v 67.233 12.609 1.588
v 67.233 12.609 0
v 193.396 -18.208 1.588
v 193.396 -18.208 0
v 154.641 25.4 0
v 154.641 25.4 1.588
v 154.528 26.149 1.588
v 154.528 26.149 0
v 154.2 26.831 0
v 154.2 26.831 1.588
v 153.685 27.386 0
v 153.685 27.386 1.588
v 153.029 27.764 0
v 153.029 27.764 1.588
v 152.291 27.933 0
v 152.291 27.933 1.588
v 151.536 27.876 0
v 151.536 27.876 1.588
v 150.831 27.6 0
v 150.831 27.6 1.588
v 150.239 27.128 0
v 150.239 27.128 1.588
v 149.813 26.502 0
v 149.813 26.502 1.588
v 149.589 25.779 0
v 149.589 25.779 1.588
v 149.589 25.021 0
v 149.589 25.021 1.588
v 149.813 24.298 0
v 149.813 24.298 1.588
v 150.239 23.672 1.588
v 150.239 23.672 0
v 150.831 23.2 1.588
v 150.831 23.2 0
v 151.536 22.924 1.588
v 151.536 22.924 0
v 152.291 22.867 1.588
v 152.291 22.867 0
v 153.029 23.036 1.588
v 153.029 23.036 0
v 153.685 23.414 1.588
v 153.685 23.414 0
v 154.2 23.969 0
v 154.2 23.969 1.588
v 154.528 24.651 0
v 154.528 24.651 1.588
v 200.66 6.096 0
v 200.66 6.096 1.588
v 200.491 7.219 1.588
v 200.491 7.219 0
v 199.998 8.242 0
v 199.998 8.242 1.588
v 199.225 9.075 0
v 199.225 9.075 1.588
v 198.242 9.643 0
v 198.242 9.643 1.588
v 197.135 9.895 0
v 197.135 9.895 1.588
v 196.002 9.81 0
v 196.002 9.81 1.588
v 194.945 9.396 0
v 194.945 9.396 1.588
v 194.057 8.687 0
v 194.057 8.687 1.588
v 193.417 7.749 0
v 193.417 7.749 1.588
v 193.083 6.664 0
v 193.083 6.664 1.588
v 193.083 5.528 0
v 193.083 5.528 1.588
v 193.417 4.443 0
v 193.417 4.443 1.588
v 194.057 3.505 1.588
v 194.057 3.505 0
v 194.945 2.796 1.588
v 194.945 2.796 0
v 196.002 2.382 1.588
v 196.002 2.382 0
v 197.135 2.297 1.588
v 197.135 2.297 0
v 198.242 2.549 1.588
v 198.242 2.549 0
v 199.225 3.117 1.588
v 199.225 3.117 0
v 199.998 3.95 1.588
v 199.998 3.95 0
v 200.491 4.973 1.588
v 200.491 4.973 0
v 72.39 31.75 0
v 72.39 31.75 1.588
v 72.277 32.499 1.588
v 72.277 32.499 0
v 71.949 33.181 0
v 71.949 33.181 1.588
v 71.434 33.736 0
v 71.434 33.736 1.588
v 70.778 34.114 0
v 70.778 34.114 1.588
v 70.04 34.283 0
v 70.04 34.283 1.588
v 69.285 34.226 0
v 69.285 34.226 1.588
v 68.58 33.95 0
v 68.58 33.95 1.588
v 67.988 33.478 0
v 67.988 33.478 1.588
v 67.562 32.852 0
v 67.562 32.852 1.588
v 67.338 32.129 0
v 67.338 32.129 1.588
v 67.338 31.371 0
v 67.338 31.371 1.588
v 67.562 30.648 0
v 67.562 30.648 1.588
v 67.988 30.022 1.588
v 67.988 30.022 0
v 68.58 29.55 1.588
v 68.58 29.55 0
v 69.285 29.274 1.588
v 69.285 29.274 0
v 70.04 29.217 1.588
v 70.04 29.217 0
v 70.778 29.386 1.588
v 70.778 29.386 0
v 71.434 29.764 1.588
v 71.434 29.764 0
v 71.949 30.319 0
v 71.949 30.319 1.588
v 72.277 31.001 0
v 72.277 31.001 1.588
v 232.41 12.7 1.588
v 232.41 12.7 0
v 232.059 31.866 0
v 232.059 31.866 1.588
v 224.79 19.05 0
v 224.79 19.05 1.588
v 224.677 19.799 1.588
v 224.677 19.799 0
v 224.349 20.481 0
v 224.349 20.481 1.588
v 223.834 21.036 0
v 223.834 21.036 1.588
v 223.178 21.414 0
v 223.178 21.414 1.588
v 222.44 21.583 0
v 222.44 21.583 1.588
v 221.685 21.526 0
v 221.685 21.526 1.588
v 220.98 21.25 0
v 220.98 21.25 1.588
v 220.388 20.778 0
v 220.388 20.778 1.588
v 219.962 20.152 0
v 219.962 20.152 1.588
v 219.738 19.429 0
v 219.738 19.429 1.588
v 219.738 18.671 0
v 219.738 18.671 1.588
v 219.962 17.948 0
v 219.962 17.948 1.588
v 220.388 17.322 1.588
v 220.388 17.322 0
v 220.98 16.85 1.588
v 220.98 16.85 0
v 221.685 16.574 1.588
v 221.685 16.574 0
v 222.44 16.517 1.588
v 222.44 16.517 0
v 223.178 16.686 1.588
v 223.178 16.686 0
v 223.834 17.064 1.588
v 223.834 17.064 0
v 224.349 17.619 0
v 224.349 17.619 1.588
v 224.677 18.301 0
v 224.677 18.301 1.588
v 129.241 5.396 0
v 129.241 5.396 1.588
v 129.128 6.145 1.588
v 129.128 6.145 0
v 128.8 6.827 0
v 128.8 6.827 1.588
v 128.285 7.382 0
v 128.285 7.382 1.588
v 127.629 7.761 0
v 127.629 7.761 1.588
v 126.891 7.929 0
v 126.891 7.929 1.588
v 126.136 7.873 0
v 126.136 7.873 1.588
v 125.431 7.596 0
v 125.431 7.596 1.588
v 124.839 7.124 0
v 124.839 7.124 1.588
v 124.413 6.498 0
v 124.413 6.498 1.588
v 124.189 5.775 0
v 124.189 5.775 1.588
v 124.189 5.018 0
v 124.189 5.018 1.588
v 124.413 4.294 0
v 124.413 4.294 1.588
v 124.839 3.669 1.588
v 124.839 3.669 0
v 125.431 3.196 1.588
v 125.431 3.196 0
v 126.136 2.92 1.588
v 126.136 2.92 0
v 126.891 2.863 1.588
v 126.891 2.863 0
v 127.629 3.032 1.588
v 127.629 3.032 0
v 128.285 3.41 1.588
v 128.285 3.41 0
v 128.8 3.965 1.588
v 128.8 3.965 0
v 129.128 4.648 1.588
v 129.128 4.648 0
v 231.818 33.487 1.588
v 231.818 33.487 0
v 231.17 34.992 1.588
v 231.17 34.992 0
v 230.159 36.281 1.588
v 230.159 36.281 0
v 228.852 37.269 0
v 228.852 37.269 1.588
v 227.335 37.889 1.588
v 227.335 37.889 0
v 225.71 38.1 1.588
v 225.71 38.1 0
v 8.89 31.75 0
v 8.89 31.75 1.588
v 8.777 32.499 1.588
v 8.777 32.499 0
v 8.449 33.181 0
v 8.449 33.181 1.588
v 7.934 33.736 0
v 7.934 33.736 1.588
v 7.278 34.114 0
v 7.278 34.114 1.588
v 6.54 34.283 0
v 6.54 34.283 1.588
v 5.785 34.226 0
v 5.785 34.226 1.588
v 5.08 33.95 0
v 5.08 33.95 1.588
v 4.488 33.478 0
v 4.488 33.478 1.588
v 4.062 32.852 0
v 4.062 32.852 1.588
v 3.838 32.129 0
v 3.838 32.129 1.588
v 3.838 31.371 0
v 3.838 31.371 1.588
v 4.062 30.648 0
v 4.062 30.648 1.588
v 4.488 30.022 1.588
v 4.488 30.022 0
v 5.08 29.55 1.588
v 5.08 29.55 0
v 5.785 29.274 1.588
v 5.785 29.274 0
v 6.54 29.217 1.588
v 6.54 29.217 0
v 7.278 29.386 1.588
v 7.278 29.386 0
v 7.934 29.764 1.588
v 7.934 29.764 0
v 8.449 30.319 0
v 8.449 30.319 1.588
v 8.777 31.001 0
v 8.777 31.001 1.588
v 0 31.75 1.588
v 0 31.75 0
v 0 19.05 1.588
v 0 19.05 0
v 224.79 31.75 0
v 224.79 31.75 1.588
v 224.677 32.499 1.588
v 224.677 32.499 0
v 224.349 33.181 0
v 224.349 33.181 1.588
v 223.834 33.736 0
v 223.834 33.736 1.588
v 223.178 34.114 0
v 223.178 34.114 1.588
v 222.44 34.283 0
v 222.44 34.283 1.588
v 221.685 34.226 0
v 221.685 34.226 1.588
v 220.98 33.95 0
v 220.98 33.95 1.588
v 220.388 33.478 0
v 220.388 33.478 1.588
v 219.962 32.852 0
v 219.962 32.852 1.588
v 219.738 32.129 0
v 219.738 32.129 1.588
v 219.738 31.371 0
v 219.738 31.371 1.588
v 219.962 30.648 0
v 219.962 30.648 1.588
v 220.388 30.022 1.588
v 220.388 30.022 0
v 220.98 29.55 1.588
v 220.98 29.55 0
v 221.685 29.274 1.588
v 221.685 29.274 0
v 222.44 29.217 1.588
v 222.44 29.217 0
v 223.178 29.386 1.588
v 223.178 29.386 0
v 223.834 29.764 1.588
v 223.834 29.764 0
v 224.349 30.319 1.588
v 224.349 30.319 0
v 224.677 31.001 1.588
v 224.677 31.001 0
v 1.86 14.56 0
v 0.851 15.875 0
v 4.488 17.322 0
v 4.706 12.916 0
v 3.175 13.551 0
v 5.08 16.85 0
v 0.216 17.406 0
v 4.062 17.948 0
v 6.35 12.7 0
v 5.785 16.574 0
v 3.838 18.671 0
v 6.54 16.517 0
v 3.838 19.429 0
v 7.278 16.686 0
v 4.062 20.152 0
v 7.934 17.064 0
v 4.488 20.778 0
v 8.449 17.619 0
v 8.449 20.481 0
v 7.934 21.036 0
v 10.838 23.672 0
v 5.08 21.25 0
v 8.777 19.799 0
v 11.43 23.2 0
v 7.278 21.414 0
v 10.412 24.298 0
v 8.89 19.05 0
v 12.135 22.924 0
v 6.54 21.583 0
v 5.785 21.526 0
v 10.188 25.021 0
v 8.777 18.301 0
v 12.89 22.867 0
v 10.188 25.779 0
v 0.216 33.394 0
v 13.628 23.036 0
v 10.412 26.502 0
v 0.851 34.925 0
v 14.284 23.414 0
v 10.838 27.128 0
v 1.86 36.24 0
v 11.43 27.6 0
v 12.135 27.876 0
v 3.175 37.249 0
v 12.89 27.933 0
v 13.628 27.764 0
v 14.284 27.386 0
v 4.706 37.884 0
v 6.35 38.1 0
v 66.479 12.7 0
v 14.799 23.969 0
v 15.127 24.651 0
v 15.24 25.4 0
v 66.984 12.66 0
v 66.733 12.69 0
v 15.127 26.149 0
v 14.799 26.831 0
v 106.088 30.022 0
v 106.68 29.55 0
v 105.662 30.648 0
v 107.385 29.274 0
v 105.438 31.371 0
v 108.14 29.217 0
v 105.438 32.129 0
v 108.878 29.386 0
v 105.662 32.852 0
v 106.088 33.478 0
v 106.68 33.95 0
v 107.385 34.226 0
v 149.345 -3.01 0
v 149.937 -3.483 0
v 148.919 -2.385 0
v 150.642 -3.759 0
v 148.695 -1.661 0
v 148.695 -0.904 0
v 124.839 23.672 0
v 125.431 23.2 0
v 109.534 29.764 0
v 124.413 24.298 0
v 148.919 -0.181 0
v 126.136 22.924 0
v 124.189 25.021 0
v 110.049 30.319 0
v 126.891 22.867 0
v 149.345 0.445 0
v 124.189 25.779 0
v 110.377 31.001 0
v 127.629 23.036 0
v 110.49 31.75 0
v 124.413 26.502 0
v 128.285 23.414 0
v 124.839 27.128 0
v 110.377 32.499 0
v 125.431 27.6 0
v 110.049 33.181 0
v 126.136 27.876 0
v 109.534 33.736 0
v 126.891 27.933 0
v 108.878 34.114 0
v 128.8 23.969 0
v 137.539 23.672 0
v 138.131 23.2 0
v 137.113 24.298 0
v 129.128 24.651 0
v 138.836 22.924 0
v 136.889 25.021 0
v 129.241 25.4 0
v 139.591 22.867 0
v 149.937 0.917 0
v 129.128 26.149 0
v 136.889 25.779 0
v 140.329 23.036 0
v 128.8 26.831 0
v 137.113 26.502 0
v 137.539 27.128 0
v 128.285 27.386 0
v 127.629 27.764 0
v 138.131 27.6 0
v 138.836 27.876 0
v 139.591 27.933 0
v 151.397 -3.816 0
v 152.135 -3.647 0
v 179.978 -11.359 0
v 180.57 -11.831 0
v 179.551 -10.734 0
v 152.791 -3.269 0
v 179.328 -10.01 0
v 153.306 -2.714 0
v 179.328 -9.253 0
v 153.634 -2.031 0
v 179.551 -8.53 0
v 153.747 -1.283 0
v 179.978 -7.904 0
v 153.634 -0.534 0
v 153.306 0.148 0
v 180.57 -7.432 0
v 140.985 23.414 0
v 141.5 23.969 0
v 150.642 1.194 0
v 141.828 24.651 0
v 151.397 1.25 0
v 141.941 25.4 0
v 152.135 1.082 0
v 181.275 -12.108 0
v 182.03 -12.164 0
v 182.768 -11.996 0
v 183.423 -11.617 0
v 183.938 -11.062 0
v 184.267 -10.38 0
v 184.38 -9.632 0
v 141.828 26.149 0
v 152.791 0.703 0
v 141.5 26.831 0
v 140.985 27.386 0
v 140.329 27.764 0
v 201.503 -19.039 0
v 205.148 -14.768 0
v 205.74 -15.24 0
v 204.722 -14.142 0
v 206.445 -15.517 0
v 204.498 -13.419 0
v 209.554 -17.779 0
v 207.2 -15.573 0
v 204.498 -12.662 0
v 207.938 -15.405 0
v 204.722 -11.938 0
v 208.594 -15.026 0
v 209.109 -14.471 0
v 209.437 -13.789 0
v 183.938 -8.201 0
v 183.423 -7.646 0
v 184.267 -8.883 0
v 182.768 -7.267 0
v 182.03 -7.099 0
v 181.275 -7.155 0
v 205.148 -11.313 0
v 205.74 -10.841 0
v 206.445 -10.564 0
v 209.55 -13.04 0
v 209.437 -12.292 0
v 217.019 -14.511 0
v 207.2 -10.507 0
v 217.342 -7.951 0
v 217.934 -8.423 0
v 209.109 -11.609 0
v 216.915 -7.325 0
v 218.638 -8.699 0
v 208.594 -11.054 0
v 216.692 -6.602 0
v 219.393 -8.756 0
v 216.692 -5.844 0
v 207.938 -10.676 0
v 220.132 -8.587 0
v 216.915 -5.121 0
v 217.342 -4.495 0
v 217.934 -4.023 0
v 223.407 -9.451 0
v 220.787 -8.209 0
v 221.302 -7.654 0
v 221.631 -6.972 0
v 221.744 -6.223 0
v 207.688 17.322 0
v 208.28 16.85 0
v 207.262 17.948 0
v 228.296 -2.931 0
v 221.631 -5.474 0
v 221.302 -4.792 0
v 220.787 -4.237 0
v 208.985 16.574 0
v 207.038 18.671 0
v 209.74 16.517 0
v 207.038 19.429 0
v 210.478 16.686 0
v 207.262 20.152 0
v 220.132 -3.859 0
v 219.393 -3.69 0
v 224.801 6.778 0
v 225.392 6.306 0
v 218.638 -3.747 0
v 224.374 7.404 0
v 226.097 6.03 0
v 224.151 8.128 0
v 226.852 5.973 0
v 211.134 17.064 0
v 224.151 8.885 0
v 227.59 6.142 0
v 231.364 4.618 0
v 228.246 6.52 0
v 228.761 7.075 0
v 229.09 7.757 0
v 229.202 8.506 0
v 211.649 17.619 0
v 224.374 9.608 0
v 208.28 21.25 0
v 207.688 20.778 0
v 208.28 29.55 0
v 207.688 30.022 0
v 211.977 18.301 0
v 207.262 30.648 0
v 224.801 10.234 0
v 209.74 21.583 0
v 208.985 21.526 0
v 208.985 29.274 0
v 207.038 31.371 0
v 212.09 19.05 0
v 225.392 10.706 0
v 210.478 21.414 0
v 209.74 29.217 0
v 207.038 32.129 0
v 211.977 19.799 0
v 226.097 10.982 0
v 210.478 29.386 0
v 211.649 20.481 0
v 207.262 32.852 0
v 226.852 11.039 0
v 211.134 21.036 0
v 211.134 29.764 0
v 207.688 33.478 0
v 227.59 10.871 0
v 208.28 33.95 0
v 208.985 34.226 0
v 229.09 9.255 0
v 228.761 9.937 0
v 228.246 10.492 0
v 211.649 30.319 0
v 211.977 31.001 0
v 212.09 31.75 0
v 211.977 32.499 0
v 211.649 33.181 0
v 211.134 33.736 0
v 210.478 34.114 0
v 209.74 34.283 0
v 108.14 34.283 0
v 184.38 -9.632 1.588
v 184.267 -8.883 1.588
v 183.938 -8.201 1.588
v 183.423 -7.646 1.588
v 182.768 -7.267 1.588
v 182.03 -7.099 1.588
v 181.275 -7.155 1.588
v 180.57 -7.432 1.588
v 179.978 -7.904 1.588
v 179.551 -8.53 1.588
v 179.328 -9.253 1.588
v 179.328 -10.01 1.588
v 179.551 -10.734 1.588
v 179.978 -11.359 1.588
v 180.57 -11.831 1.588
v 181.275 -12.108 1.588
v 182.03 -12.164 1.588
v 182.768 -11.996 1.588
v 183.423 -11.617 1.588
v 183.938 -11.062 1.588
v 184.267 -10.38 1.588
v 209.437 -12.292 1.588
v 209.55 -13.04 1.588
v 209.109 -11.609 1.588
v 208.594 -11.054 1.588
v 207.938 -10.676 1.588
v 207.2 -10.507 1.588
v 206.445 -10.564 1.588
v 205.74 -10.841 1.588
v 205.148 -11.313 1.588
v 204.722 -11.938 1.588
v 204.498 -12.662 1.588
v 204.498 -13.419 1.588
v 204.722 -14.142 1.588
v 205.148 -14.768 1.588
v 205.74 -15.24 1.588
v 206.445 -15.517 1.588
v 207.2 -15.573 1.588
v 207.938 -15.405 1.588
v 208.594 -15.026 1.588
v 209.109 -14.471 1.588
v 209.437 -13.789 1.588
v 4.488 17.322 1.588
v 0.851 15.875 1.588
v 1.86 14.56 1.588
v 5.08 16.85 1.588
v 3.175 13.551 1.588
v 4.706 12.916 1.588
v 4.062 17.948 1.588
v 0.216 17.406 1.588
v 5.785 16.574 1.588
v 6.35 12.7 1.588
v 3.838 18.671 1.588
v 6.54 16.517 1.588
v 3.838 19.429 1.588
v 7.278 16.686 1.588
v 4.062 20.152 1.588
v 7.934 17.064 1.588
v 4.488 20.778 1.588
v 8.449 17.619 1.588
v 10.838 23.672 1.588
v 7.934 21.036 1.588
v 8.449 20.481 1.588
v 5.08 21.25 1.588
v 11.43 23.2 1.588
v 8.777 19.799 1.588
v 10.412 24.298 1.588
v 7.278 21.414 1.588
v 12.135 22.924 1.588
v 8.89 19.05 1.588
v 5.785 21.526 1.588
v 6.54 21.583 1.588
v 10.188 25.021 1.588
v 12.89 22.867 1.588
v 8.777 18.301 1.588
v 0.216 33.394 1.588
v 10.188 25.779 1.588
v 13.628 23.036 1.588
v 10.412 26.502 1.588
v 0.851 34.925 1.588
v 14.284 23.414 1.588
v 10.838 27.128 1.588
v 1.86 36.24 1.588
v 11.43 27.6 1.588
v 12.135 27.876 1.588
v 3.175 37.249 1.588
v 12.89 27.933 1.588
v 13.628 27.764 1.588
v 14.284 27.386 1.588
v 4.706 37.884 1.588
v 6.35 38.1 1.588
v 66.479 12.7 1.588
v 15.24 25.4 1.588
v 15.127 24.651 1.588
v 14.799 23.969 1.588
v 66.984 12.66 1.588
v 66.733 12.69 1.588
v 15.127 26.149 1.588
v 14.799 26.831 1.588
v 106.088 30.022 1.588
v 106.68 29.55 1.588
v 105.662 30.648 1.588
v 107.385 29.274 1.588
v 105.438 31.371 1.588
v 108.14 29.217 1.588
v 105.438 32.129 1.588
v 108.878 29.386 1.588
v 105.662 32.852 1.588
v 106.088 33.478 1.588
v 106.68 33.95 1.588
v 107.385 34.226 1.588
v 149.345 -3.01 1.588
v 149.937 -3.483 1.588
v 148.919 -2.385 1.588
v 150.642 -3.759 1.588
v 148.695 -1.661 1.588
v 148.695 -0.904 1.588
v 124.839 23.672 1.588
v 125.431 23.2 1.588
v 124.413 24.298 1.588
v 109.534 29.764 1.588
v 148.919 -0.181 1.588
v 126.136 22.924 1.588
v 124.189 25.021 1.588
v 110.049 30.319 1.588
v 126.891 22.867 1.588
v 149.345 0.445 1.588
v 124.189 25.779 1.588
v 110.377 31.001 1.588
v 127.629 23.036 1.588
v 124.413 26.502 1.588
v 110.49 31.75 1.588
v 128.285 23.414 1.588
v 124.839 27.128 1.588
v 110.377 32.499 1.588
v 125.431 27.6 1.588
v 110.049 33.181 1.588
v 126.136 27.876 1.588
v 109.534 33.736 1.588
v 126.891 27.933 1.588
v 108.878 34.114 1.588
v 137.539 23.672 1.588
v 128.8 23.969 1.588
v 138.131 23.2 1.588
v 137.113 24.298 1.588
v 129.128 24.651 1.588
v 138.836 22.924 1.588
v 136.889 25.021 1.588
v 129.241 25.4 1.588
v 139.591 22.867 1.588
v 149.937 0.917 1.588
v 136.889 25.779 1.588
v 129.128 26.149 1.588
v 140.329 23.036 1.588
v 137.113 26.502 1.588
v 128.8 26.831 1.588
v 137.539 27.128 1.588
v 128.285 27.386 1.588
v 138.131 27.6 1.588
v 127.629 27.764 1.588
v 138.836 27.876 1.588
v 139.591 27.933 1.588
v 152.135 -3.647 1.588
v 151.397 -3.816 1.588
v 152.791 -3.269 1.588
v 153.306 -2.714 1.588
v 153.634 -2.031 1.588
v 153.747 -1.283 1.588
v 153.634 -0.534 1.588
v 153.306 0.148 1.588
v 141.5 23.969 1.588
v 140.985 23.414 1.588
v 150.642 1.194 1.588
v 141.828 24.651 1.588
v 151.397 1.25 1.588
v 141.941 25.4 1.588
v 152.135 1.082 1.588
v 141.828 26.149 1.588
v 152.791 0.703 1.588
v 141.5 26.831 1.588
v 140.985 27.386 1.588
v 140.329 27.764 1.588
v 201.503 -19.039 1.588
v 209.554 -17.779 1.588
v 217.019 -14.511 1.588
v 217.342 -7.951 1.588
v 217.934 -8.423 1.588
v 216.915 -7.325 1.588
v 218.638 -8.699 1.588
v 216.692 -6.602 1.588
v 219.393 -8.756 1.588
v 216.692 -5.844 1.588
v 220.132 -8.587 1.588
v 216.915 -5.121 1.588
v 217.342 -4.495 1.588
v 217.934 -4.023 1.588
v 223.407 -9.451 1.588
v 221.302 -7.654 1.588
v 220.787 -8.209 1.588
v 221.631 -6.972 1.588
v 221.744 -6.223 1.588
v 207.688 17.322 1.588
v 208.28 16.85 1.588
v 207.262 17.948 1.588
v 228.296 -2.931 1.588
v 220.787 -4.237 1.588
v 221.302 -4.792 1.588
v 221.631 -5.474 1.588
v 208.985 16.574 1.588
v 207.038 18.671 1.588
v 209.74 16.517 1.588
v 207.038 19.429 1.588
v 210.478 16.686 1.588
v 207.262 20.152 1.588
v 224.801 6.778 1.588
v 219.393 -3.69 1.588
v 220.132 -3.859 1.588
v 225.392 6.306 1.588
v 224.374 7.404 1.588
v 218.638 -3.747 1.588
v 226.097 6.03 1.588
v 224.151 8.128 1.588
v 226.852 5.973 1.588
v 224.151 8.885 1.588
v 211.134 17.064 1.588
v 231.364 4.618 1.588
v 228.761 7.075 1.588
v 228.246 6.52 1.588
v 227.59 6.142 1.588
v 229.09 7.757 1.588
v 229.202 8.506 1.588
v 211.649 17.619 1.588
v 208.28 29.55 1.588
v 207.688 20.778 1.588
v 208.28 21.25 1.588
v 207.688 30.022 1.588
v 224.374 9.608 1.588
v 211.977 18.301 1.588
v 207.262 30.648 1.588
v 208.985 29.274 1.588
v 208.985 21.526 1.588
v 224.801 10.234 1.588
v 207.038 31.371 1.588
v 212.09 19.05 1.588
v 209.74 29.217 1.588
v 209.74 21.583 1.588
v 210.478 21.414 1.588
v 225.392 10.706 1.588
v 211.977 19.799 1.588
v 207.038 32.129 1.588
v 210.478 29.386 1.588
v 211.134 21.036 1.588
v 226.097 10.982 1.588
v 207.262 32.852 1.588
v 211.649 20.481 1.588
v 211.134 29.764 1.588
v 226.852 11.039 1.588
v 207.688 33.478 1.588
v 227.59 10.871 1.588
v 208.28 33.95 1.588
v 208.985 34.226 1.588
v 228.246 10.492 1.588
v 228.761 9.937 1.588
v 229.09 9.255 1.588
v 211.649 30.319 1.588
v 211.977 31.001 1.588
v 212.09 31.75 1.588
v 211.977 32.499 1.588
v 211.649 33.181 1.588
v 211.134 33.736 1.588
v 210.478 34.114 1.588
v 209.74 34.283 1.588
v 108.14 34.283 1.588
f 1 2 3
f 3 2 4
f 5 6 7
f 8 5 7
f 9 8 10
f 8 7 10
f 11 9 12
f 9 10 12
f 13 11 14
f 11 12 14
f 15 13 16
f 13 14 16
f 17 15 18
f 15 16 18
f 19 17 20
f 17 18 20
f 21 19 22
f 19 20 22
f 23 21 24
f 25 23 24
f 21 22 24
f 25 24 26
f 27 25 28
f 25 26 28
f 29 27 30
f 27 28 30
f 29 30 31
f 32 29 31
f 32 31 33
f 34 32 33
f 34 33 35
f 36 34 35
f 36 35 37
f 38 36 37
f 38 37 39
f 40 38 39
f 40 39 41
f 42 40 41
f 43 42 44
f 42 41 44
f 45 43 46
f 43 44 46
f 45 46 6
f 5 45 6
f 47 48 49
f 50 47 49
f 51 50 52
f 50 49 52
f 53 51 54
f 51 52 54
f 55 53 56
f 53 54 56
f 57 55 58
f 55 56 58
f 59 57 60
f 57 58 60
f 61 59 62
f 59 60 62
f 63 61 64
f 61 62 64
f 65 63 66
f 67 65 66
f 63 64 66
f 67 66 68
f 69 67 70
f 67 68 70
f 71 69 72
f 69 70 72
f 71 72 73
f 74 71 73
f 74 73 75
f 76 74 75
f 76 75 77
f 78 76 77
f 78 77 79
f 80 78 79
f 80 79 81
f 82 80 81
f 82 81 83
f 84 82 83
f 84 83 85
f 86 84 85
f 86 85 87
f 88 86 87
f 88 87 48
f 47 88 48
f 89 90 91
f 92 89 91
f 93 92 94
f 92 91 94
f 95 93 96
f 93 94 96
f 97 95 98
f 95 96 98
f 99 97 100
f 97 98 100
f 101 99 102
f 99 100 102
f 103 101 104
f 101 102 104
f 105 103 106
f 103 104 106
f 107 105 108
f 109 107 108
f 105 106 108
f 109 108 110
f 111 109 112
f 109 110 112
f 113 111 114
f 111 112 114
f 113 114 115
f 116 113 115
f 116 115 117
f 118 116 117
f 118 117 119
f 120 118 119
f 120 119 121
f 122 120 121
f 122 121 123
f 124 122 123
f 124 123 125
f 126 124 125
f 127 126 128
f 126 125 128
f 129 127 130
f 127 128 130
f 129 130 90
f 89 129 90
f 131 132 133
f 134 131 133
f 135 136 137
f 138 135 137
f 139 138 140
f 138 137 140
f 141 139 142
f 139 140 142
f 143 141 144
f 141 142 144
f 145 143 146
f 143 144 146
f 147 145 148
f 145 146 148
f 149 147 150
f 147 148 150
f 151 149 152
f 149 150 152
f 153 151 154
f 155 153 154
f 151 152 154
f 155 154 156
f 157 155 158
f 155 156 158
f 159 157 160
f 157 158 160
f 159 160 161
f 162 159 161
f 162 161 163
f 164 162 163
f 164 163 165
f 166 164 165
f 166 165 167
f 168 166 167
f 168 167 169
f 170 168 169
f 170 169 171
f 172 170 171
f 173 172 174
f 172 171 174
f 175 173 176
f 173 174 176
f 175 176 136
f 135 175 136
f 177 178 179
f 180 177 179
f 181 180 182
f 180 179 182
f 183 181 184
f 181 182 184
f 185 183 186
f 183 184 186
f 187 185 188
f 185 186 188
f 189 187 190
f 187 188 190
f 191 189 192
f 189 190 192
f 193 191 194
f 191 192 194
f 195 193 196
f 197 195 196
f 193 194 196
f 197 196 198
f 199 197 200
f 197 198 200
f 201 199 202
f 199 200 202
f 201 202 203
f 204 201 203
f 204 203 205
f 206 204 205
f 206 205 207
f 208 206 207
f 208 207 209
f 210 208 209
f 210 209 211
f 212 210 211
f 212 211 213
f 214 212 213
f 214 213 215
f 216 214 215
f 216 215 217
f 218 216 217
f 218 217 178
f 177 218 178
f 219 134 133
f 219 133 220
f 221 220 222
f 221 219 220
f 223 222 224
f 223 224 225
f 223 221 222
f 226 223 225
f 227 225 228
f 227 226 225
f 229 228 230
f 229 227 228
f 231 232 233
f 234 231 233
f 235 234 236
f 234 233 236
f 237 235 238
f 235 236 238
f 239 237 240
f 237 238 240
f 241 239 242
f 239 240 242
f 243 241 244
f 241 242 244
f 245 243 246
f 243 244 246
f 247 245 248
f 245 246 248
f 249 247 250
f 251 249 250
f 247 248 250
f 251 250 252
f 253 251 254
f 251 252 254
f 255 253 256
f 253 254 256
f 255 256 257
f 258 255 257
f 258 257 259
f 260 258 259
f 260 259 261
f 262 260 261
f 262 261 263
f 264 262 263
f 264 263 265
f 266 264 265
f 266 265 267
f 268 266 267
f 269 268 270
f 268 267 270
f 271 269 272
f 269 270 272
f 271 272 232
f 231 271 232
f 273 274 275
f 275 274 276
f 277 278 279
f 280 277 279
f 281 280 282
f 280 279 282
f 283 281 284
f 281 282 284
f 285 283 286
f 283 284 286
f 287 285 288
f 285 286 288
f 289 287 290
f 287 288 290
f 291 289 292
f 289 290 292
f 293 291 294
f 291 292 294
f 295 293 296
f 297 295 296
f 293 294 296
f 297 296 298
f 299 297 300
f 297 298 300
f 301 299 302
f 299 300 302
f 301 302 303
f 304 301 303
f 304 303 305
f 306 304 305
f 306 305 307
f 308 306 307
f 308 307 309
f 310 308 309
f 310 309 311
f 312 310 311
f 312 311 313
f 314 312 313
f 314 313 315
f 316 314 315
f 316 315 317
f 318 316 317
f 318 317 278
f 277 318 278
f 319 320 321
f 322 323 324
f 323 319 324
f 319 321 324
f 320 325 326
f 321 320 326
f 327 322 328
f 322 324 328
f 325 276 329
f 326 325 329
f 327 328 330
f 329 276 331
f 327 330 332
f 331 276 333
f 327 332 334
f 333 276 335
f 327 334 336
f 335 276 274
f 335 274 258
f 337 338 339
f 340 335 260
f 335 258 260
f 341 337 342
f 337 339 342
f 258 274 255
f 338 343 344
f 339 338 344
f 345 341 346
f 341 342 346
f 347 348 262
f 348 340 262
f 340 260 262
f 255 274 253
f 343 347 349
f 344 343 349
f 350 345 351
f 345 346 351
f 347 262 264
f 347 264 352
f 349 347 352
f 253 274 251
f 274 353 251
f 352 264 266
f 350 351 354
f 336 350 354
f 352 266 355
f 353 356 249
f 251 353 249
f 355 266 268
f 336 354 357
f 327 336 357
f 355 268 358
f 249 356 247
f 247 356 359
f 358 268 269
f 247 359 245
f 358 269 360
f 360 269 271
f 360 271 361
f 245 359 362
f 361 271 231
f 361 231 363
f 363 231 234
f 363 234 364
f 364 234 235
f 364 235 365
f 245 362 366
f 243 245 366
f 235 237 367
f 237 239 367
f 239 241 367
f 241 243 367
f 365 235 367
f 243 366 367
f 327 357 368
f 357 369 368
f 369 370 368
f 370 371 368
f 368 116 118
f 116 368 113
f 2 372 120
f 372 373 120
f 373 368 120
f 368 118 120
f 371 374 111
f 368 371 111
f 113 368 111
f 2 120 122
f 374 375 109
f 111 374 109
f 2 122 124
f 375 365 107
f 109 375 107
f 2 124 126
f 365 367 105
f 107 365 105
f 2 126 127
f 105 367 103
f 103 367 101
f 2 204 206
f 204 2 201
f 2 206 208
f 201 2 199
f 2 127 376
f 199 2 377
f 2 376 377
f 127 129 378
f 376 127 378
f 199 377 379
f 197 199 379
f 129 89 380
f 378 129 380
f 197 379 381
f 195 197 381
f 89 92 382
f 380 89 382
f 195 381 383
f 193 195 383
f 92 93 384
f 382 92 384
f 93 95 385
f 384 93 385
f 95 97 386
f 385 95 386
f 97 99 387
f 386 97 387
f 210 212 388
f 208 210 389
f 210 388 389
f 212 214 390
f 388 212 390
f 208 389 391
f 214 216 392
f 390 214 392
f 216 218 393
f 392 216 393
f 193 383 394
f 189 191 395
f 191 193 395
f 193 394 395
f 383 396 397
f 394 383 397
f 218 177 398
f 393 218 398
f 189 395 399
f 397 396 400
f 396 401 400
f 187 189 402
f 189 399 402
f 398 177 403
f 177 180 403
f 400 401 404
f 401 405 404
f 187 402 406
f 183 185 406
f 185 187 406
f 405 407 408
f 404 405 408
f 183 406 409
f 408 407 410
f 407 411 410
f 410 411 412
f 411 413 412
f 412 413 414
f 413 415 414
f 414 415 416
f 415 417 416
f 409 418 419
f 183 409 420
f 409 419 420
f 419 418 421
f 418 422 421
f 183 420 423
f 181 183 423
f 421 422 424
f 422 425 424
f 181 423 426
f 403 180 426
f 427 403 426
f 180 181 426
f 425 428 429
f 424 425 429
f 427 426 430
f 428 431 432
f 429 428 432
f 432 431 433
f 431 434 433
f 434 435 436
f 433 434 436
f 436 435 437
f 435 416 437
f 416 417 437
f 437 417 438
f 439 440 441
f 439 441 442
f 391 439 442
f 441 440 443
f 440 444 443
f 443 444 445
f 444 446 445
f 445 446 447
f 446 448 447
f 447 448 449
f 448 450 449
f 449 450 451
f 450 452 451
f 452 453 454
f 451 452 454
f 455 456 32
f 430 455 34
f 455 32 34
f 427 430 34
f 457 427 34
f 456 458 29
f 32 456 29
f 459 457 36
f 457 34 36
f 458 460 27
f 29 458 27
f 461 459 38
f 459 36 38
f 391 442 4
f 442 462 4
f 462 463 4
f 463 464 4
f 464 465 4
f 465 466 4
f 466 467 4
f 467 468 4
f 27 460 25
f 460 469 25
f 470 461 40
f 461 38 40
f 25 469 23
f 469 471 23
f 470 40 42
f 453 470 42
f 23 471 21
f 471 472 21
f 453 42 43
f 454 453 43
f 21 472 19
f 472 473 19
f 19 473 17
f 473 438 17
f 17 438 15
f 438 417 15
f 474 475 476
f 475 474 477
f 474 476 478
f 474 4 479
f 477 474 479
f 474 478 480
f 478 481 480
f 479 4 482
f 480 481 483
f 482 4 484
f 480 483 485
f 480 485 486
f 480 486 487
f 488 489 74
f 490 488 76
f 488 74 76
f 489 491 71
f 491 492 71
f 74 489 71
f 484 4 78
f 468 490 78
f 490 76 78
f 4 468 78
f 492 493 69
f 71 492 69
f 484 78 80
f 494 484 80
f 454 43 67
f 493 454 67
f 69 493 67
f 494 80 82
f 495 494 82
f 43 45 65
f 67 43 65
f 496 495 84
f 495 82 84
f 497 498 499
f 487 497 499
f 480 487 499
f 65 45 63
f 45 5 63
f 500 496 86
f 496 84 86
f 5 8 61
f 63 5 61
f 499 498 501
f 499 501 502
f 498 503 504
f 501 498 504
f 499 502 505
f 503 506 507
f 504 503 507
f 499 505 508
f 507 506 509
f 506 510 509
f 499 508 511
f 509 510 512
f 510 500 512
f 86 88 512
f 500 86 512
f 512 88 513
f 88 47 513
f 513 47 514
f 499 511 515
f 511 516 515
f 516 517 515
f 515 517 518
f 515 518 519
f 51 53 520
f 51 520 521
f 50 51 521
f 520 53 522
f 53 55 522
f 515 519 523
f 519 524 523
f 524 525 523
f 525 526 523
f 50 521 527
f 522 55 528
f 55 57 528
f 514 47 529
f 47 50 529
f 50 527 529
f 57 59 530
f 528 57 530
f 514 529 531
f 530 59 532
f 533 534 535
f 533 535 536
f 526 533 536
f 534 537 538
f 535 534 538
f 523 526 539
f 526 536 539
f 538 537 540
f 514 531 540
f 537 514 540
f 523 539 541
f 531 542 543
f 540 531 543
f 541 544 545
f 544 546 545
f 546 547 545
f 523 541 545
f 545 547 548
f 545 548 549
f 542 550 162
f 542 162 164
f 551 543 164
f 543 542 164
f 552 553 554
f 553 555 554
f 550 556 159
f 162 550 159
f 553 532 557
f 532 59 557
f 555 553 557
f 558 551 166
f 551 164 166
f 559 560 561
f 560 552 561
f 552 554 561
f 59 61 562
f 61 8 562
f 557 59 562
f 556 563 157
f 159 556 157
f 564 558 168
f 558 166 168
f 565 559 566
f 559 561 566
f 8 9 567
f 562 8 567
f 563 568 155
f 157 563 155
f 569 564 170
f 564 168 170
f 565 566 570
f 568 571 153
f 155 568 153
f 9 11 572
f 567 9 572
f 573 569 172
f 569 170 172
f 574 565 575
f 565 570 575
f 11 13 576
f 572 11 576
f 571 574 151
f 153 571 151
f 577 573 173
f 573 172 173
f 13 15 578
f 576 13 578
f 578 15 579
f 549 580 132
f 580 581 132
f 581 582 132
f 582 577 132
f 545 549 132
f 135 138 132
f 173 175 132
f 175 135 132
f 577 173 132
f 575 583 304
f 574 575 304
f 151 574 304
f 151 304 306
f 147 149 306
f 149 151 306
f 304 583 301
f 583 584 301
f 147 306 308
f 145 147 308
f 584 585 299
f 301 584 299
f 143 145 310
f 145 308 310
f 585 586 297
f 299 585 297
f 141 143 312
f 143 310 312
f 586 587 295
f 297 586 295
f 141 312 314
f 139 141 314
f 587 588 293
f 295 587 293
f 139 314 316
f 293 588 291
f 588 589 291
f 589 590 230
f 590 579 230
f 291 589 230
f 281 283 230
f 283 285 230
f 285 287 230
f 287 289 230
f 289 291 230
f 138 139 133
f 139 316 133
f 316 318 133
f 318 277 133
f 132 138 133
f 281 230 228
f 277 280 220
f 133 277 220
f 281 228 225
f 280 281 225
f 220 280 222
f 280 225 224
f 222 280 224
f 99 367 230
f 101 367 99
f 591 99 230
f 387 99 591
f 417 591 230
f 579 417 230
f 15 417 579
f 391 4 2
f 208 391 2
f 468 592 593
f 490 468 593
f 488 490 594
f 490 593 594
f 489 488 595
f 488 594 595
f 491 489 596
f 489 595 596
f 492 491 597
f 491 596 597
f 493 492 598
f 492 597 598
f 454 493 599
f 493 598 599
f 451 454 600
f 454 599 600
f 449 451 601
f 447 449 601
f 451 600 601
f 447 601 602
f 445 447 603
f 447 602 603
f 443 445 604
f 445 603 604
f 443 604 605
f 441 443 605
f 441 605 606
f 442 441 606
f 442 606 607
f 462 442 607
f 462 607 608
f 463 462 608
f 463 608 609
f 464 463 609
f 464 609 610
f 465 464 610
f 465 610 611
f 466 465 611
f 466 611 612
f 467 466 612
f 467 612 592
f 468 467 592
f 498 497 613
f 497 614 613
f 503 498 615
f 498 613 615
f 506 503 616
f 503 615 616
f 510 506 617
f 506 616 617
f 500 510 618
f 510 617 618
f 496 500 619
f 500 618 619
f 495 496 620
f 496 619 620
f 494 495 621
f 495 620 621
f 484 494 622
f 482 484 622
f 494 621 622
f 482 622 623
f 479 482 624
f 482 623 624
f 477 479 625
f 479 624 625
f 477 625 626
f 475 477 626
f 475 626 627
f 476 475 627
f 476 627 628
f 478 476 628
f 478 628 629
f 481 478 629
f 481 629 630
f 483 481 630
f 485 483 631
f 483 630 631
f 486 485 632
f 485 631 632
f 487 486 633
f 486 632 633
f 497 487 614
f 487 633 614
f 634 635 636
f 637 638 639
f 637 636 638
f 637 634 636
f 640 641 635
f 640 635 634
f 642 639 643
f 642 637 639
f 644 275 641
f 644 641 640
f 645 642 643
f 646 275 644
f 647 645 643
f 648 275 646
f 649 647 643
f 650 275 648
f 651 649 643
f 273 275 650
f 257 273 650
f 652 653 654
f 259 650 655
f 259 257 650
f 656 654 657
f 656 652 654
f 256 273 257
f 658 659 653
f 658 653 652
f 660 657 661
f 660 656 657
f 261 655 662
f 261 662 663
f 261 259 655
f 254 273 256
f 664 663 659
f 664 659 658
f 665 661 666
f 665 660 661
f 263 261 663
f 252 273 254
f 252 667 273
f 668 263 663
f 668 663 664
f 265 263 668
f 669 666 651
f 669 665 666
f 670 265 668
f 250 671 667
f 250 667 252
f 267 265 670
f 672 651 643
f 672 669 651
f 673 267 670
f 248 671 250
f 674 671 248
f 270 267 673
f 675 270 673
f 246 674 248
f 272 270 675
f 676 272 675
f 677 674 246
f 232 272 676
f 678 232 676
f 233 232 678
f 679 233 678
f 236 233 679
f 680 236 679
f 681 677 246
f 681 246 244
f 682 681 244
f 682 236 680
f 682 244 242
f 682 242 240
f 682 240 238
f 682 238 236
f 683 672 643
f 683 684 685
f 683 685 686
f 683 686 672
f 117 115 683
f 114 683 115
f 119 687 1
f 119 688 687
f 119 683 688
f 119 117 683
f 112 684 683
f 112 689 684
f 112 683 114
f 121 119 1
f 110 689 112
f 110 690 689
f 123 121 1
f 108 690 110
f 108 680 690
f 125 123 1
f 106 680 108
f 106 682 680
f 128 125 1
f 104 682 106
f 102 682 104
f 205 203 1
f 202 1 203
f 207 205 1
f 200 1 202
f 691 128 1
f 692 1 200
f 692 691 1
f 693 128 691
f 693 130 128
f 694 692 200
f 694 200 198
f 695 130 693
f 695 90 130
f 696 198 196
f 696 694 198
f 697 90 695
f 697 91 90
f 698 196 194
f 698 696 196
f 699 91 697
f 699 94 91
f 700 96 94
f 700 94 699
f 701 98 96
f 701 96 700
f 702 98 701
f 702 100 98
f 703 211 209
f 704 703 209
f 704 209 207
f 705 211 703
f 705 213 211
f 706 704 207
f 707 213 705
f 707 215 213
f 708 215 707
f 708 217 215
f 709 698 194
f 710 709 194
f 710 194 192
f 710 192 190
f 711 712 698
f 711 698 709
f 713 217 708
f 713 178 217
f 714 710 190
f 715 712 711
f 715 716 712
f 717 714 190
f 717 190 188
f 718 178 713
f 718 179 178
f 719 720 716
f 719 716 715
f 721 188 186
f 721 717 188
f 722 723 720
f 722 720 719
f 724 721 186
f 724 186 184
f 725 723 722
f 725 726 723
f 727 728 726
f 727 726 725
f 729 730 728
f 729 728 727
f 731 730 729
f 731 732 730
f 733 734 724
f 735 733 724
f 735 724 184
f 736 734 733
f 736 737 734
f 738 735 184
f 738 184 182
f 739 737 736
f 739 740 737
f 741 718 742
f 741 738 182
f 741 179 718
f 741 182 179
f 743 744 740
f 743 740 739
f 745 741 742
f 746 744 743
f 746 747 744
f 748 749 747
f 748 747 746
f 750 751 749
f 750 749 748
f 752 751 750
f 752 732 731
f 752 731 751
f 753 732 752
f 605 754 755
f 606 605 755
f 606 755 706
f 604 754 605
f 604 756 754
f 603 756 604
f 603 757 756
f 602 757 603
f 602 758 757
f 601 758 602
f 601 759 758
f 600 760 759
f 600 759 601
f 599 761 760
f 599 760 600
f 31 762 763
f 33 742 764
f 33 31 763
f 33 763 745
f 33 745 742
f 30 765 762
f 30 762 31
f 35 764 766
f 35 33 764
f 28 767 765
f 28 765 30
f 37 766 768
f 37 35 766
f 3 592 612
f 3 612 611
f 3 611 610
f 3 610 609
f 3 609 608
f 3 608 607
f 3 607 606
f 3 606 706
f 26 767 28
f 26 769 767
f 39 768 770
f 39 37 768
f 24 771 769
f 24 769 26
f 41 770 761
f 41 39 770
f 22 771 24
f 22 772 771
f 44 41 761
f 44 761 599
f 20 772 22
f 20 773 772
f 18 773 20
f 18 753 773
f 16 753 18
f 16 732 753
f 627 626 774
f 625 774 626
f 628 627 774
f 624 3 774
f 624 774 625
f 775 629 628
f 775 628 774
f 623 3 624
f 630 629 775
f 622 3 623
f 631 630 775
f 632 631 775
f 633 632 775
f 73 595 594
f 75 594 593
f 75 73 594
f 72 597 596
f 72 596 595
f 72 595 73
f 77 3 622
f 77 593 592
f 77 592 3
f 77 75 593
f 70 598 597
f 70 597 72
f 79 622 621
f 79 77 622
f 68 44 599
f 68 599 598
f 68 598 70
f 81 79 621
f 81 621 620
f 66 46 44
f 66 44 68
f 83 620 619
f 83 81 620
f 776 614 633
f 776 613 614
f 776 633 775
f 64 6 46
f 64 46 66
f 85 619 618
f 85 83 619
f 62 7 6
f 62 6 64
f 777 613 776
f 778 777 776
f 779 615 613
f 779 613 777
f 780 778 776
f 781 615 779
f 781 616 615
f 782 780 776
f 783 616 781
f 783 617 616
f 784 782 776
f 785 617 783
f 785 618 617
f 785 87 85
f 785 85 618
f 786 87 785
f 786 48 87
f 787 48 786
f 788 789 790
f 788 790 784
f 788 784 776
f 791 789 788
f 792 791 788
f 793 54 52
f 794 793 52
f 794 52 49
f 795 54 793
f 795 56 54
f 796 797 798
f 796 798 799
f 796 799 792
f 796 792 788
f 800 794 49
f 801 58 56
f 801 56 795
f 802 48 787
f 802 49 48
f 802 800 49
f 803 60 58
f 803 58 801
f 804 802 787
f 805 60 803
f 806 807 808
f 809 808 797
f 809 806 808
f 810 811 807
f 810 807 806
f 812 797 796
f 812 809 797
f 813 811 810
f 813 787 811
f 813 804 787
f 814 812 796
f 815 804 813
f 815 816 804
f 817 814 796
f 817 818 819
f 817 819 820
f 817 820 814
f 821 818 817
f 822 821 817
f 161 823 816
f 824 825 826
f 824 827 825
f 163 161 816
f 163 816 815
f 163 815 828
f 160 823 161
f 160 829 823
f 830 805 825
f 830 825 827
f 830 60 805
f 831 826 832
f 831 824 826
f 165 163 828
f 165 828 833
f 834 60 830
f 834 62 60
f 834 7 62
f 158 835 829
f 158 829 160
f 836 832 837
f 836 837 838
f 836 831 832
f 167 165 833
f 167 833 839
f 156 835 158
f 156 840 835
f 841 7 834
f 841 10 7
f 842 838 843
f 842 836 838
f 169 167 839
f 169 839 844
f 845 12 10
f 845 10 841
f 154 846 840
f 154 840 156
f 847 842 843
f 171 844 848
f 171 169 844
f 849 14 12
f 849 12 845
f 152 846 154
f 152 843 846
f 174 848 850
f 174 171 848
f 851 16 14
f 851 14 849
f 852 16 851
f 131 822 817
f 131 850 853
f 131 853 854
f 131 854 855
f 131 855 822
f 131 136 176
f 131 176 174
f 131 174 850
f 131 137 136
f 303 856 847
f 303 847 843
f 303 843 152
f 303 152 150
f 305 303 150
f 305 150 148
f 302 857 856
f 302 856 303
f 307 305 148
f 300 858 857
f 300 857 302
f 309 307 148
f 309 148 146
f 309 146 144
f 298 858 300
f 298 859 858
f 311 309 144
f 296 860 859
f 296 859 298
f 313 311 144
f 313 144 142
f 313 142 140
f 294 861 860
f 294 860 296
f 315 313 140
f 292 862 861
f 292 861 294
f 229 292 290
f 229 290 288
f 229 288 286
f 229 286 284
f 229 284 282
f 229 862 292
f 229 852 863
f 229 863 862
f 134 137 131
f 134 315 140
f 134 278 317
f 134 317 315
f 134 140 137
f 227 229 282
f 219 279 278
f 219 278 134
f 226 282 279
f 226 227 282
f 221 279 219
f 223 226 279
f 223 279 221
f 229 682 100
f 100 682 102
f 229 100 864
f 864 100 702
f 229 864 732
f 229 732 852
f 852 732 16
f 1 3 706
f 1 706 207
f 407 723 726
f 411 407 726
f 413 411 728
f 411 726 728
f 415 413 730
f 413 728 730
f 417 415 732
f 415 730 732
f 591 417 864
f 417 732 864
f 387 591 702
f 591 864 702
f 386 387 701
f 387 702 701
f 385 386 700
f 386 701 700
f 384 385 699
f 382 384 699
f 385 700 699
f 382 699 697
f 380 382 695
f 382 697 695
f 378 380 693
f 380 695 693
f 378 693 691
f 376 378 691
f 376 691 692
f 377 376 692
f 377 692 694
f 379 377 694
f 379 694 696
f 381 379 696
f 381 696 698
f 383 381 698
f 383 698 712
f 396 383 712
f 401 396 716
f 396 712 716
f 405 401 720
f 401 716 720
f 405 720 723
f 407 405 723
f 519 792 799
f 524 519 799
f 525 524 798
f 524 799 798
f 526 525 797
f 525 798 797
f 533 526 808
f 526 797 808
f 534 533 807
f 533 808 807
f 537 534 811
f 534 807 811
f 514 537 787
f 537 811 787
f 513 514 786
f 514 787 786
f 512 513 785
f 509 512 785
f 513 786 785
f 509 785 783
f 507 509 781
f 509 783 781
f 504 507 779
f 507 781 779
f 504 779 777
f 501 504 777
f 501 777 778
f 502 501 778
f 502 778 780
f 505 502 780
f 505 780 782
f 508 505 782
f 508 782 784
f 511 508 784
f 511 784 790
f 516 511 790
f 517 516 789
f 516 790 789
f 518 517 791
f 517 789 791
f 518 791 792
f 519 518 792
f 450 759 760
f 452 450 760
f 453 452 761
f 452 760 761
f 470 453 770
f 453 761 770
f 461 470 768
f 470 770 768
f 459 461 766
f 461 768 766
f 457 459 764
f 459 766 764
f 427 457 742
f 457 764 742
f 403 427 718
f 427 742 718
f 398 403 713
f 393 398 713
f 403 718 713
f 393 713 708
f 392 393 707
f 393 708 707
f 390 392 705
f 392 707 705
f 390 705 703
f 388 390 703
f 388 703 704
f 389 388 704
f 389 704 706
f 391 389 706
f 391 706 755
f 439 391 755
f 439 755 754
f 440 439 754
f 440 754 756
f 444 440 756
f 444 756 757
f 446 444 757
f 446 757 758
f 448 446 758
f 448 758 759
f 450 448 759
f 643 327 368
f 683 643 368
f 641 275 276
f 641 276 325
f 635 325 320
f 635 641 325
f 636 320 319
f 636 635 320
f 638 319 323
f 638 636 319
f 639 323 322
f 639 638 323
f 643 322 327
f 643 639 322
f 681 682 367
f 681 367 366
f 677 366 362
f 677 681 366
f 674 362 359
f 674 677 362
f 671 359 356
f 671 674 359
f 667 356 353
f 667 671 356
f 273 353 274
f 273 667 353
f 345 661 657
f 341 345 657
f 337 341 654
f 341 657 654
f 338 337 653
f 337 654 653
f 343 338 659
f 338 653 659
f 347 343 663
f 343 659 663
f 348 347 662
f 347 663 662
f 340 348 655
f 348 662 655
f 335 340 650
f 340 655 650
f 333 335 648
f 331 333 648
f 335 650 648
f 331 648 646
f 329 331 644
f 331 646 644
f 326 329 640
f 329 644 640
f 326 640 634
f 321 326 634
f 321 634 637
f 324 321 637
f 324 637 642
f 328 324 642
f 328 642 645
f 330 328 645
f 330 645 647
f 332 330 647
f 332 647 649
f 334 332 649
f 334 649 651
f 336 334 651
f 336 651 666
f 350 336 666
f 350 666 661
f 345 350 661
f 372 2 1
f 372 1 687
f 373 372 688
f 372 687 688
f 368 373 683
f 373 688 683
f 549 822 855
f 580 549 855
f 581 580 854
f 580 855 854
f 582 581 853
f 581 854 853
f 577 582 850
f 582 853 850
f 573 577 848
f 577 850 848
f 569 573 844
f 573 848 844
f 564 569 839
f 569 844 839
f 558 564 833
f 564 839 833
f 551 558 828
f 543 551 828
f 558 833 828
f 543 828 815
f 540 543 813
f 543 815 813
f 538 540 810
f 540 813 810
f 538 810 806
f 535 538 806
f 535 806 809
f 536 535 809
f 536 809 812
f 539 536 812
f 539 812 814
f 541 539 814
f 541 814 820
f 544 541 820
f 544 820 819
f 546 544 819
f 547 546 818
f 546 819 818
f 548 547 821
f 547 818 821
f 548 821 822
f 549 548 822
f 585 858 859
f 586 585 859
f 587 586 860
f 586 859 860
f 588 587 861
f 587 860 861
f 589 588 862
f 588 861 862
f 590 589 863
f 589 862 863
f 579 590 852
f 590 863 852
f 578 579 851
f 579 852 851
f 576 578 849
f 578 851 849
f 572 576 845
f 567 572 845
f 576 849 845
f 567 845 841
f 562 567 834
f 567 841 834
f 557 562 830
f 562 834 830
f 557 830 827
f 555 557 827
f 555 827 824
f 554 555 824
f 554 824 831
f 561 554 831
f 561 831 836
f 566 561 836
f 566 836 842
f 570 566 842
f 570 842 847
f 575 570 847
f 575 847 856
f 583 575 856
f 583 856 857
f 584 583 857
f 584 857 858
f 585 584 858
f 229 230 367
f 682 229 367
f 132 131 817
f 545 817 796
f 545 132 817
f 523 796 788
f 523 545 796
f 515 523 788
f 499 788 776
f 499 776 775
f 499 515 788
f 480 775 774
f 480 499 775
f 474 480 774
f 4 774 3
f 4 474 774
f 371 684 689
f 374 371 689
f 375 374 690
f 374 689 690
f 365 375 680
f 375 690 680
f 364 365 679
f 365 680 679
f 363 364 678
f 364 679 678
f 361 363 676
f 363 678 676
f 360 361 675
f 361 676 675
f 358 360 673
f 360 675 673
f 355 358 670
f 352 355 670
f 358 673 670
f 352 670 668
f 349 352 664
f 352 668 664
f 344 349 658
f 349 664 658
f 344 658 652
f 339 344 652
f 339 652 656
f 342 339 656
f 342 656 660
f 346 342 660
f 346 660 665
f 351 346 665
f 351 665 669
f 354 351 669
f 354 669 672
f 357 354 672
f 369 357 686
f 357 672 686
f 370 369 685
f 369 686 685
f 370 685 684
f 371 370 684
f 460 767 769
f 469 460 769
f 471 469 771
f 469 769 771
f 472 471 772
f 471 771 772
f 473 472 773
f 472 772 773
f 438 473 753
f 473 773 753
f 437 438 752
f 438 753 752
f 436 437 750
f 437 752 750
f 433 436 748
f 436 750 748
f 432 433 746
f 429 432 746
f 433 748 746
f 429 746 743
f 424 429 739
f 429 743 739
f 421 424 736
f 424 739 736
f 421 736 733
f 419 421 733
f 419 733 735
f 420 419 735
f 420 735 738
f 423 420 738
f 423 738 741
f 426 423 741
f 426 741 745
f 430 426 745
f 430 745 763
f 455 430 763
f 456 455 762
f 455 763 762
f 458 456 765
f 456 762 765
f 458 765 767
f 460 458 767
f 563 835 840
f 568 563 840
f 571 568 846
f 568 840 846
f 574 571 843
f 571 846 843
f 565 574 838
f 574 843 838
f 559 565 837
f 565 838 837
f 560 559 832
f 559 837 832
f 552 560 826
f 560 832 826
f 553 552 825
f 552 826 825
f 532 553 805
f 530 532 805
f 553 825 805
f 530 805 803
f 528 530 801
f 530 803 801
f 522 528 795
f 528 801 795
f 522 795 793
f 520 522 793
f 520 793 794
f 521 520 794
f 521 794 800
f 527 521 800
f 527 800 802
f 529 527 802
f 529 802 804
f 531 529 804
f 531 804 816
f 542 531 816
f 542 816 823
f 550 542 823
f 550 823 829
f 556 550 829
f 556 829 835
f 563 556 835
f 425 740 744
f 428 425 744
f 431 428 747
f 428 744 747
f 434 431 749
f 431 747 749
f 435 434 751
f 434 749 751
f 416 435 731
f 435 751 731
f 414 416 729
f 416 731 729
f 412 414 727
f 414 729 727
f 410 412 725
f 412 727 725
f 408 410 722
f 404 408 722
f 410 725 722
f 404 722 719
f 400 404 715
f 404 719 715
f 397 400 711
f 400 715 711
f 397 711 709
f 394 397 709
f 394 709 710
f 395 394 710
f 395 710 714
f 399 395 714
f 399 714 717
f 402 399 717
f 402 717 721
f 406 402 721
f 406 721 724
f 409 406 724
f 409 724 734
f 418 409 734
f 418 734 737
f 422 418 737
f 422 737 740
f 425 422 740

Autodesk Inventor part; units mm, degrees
ref_plane "YZ Plane" through (0, 0, 0) normal (1, 0, 0) x (0, 1, 0)
ref_plane "XZ Plane" through (0, 0, 0) normal (0, 1, 0) x (-1, 0, 0)
ref_plane "XY Plane" through (0, 0, 0) normal (0, 0, 1) x (1, 0, 0)
sketch "Sketch1" plane through (0, 0, 0) normal (0, 0, 1) x (1, 0, 0)
  line L0 (0, 0) -> (247.65, 0)
  line L1 (247.65, 0) -> (247.65, 38.1)
  line L2 (247.65, 38.1) -> (0, 38.1)
  line L3 (0, 38.1) -> (0, 0)
  line L4 (286.1616, 0) -> (255.1962, 0)
  line L5 (255.1962, 0) -> (255.1962, 12.7)
  line L6 (255.1962, 12.7) -> (286.1616, 12.7)
  line L7 (286.1616, 12.7) -> (286.1616, 0)
  line L8 (247.65, 12.7) -> (200.66, 12.7)
  line L9 (16.2468, 38.1) -> (16.2468, 12.7)
  line L10 (16.2468, 12.7) -> (196.85, 12.7)
  line L11 (0, 12.7) -> (17.7951, 12.7)
  circle A0 centre (200.66, 12.7) radius 31.75
  line L12 (232.41, 12.7) -> (231.9451, 38.1)
  line L13 (66.8614, 12.7) -> (200.8653, -20.0324)
  line L14 (193.3963, -18.208) -> (168.91, 12.7)
  point P0 (187.853, -16.3524)
  point P1 (232.3887, 13.8619)
  point P2 (229.7594, 0)
  point P3 (181.61, 38.1)
  point P4 (219.71, 38.1)
  point P5 (171.5606, 0)
  dimension "d0" = 247.65
  dimension "d1" = 38.1
  dimension "d2" = 12.7
  dimension "d3" = 30.9654
  dimension "d4" = 46.99
  dimension "d10" = 25.4
  dimension "d54" = 63.5
extrude "Extrusion4" add sketch "Sketch1" along normal blind 1.5875 contours L13 L0 A0 | L13 L10 A0 L0 | L3 L2 L9 L11 | A0 L14 L0 | L0 L14 A0 | L10 L9 L2 A0 | L14 L0 A0 | L14 A0 L2 L12 L0 | L2 L12 A0
fillet "Fillet6" radius 6.35 3 edges at (0, 38.1, 0.7937) (0, 12.7, 0.7937) (231.9451, 38.1, 0.7937)
sketch "Sketch4" plane through (0, 0, 1.5875) normal (0, 0, 1) x (1, 0, 0)
  arc A0 (6.35, 38.1) -> (0, 31.75) centre (6.35, 31.75) ccw projected
  line L0 (6.35, 38.1) -> (6.35, 31.75)
  line L1 (6.35, 31.75) -> (0, 31.75)
  circle A1 centre (6.35, 31.75) radius 2.54
  line L2 (6.35, 31.75) -> (6.35, 19.05)
  circle A2 centre (6.35, 19.05) radius 2.54
  line L3 (6.35, 31.75) -> (57.15, 31.75)
  line L4 (57.15, 31.75) -> (107.95, 31.75)
  line L5 (107.95, 31.75) -> (158.75, 31.75)
  line L6 (158.75, 31.75) -> (209.55, 31.75)
  circle A3 centre (107.95, 31.75) radius 2.54
  circle A4 centre (209.55, 31.75) radius 2.54
  line L7 (57.15, 31.75) -> (57.15, 19.05)
  line L8 (57.15, 19.05) -> (107.95, 19.05)
  line L9 (107.95, 19.05) -> (158.75, 19.05)
  line L10 (158.75, 19.05) -> (209.55, 19.05)
  circle A5 centre (209.55, 19.05) radius 2.54
  line L11 (225.7103, 38.1) -> (6.35, 38.1) projected
  arc A6 (193.3963, -18.208) -> (232.41, 12.7) centre (200.66, 12.7) ccw projected
  line L12 (209.55, 31.75) -> (196.85, 31.75)
  line L13 (196.85, 31.75) -> (196.85, 19.05)
  circle A7 centre (196.85, 31.75) radius 2.54
  line L14 (196.85, 19.05) -> (196.85, 6.096)
  circle A8 centre (196.85, 6.096) radius 3.81
  line L15 (57.15, 31.75) -> (69.85, 31.75)
  circle A9 centre (69.85, 31.75) radius 2.54
  point P0 (0, 0)
  point P1 (207.01, 31.75)
  dimension "d60" = 6.35
  dimension "d61" = 5.08
  dimension "d62" = 12.7
  dimension "d63" = 5.08
  dimension "d64" = 50.8
  dimension "d65" = 50.8
  dimension "d66" = 50.8
  dimension "d67" = 50.8
  dimension "d70" = 5.08
  dimension "d72" = 5.08
  dimension "d76" = 5.08
  dimension "d86" = 12.7
  dimension "d88" = 5.08
  dimension "d89" = 12.954
  dimension "d90" = 7.62
  dimension "d116" = 12.7
  dimension "d117" = 5.08
extrude "Extrusion5" cut sketch "Sketch4" against normal blind 25.4 contours A4 | A5 | A8 | A2 | A1 L3 L0 | L0 L1 A1 | L1 L2 A1 | L3 A1 L2 | A9 L4 | L4 A9 | A3 L5 L4 | L4 L5 A3
sketch "Sketch5" plane through (0, 0, 1.5875) normal (0, 0, 1) x (1, 0, 0)
  circle A0 centre (209.55, 31.75) radius 2.54 projected
  line L0 (209.55, 31.75) -> (222.25, 31.75)
  line L1 (222.25, 31.75) -> (222.25, 19.05)
  line L2 (222.25, 19.05) -> (226.6625, 8.5061)
  line L3 (226.6625, 8.5061) -> (219.2036, -6.223)
  line L4 (219.2036, -6.223) -> (207.01, -13.0403)
  line L5 (207.01, -13.0403) -> (181.8398, -9.6316)
  line L6 (181.8398, -9.6316) -> (151.2071, -1.2828)
  line L7 (151.2071, -1.2828) -> (126.701, 5.3962)
  circle A1 centre (126.701, 5.3962) radius 2.54
  circle A2 centre (151.2071, -1.2828) radius 2.54
  circle A3 centre (181.8398, -9.6316) radius 2.54
  circle A4 centre (207.01, -13.0403) radius 2.54
  circle A5 centre (219.2036, -6.223) radius 2.54
  circle A6 centre (226.6625, 8.5061) radius 2.54
  circle A7 centre (222.25, 19.05) radius 2.54
  circle A8 centre (222.25, 31.75) radius 2.54
  circle A9 centre (6.35, 19.05) radius 2.54 projected
  line L8 (6.35, 19.05) -> (15.3303, 28.0303)
  line L9 (6.35, 19.05) -> (19.05, 19.05) construction
  circle A10 centre (6.35, 31.75) radius 2.54 projected
  line L10 (6.35, 31.75) -> (15.3303, 22.7697)
  line L11 (6.35, 31.75) -> (19.05, 31.75) construction
  circle A11 centre (12.7, 25.4) radius 2.54
  line L12 (126.701, 5.3962) -> (126.701, 25.4)
  line L13 (126.701, 25.4) -> (139.401, 25.4)
  line L14 (139.401, 25.4) -> (152.101, 25.4)
  circle A12 centre (126.701, 25.4) radius 2.54
  circle A13 centre (139.401, 25.4) radius 2.54
  circle A14 centre (152.101, 25.4) radius 2.54
  point P0 (0, 0)
  dimension "d91" = 12.7
  dimension "d92" = 12.7
  dimension "d93" = 11.43
  dimension "d94" = 16.51
  dimension "d95" = 13.97
  dimension "d96" = 25.4
  dimension "d97" = 31.75
  dimension "d98" = 25.4
  dimension "d99" = 5.08
  dimension "d100" = 5.08
  dimension "d101" = 5.08
  dimension "d102" = 5.08
  dimension "d103" = 5.08
  dimension "d104" = 5.08
  dimension "d105" = 5.08
  dimension "d106" = 5.08
  dimension "d109" = 12.7
  dimension "d110" = 45
  dimension "d111" = 12.7
  dimension "d112" = 45
  dimension "d113" = 5.08
  dimension "d129" = 12.7
  dimension "d130" = 12.7
  dimension "d131" = 5.08
  dimension "d132" = 5.08
  dimension "d133" = 5.08
extrude "Extrusion6" cut sketch "Sketch5" against normal blind 25.4 contours A14 | A13 L14 L13 | L13 L14 A13 | A12 L13 L12 | L12 L13 A12 | A1 L12 L7 | L7 L12 A1 | A2 L7 L6 | L6 L7 A2 | A3 L6 L5 | L5 L6 A3 | A4 L5 L4 | L4 L5 A4 | A5 L4 L3 | L3 L4 A5 | A6 L3 L2 | L2 L3 A6 | A7 L2 L1 | L1 L2 A7 | A8 L1 L0 | L0 L1 A8 | A11 L10 L8 | L8 L10 A11 | L10 A11 L8 | L8 A11 L10
fillet "Fillet7" radius 3.175 1 edges at (66.8614, 12.7, 0.7937)
properties part number "intake sled v5"
